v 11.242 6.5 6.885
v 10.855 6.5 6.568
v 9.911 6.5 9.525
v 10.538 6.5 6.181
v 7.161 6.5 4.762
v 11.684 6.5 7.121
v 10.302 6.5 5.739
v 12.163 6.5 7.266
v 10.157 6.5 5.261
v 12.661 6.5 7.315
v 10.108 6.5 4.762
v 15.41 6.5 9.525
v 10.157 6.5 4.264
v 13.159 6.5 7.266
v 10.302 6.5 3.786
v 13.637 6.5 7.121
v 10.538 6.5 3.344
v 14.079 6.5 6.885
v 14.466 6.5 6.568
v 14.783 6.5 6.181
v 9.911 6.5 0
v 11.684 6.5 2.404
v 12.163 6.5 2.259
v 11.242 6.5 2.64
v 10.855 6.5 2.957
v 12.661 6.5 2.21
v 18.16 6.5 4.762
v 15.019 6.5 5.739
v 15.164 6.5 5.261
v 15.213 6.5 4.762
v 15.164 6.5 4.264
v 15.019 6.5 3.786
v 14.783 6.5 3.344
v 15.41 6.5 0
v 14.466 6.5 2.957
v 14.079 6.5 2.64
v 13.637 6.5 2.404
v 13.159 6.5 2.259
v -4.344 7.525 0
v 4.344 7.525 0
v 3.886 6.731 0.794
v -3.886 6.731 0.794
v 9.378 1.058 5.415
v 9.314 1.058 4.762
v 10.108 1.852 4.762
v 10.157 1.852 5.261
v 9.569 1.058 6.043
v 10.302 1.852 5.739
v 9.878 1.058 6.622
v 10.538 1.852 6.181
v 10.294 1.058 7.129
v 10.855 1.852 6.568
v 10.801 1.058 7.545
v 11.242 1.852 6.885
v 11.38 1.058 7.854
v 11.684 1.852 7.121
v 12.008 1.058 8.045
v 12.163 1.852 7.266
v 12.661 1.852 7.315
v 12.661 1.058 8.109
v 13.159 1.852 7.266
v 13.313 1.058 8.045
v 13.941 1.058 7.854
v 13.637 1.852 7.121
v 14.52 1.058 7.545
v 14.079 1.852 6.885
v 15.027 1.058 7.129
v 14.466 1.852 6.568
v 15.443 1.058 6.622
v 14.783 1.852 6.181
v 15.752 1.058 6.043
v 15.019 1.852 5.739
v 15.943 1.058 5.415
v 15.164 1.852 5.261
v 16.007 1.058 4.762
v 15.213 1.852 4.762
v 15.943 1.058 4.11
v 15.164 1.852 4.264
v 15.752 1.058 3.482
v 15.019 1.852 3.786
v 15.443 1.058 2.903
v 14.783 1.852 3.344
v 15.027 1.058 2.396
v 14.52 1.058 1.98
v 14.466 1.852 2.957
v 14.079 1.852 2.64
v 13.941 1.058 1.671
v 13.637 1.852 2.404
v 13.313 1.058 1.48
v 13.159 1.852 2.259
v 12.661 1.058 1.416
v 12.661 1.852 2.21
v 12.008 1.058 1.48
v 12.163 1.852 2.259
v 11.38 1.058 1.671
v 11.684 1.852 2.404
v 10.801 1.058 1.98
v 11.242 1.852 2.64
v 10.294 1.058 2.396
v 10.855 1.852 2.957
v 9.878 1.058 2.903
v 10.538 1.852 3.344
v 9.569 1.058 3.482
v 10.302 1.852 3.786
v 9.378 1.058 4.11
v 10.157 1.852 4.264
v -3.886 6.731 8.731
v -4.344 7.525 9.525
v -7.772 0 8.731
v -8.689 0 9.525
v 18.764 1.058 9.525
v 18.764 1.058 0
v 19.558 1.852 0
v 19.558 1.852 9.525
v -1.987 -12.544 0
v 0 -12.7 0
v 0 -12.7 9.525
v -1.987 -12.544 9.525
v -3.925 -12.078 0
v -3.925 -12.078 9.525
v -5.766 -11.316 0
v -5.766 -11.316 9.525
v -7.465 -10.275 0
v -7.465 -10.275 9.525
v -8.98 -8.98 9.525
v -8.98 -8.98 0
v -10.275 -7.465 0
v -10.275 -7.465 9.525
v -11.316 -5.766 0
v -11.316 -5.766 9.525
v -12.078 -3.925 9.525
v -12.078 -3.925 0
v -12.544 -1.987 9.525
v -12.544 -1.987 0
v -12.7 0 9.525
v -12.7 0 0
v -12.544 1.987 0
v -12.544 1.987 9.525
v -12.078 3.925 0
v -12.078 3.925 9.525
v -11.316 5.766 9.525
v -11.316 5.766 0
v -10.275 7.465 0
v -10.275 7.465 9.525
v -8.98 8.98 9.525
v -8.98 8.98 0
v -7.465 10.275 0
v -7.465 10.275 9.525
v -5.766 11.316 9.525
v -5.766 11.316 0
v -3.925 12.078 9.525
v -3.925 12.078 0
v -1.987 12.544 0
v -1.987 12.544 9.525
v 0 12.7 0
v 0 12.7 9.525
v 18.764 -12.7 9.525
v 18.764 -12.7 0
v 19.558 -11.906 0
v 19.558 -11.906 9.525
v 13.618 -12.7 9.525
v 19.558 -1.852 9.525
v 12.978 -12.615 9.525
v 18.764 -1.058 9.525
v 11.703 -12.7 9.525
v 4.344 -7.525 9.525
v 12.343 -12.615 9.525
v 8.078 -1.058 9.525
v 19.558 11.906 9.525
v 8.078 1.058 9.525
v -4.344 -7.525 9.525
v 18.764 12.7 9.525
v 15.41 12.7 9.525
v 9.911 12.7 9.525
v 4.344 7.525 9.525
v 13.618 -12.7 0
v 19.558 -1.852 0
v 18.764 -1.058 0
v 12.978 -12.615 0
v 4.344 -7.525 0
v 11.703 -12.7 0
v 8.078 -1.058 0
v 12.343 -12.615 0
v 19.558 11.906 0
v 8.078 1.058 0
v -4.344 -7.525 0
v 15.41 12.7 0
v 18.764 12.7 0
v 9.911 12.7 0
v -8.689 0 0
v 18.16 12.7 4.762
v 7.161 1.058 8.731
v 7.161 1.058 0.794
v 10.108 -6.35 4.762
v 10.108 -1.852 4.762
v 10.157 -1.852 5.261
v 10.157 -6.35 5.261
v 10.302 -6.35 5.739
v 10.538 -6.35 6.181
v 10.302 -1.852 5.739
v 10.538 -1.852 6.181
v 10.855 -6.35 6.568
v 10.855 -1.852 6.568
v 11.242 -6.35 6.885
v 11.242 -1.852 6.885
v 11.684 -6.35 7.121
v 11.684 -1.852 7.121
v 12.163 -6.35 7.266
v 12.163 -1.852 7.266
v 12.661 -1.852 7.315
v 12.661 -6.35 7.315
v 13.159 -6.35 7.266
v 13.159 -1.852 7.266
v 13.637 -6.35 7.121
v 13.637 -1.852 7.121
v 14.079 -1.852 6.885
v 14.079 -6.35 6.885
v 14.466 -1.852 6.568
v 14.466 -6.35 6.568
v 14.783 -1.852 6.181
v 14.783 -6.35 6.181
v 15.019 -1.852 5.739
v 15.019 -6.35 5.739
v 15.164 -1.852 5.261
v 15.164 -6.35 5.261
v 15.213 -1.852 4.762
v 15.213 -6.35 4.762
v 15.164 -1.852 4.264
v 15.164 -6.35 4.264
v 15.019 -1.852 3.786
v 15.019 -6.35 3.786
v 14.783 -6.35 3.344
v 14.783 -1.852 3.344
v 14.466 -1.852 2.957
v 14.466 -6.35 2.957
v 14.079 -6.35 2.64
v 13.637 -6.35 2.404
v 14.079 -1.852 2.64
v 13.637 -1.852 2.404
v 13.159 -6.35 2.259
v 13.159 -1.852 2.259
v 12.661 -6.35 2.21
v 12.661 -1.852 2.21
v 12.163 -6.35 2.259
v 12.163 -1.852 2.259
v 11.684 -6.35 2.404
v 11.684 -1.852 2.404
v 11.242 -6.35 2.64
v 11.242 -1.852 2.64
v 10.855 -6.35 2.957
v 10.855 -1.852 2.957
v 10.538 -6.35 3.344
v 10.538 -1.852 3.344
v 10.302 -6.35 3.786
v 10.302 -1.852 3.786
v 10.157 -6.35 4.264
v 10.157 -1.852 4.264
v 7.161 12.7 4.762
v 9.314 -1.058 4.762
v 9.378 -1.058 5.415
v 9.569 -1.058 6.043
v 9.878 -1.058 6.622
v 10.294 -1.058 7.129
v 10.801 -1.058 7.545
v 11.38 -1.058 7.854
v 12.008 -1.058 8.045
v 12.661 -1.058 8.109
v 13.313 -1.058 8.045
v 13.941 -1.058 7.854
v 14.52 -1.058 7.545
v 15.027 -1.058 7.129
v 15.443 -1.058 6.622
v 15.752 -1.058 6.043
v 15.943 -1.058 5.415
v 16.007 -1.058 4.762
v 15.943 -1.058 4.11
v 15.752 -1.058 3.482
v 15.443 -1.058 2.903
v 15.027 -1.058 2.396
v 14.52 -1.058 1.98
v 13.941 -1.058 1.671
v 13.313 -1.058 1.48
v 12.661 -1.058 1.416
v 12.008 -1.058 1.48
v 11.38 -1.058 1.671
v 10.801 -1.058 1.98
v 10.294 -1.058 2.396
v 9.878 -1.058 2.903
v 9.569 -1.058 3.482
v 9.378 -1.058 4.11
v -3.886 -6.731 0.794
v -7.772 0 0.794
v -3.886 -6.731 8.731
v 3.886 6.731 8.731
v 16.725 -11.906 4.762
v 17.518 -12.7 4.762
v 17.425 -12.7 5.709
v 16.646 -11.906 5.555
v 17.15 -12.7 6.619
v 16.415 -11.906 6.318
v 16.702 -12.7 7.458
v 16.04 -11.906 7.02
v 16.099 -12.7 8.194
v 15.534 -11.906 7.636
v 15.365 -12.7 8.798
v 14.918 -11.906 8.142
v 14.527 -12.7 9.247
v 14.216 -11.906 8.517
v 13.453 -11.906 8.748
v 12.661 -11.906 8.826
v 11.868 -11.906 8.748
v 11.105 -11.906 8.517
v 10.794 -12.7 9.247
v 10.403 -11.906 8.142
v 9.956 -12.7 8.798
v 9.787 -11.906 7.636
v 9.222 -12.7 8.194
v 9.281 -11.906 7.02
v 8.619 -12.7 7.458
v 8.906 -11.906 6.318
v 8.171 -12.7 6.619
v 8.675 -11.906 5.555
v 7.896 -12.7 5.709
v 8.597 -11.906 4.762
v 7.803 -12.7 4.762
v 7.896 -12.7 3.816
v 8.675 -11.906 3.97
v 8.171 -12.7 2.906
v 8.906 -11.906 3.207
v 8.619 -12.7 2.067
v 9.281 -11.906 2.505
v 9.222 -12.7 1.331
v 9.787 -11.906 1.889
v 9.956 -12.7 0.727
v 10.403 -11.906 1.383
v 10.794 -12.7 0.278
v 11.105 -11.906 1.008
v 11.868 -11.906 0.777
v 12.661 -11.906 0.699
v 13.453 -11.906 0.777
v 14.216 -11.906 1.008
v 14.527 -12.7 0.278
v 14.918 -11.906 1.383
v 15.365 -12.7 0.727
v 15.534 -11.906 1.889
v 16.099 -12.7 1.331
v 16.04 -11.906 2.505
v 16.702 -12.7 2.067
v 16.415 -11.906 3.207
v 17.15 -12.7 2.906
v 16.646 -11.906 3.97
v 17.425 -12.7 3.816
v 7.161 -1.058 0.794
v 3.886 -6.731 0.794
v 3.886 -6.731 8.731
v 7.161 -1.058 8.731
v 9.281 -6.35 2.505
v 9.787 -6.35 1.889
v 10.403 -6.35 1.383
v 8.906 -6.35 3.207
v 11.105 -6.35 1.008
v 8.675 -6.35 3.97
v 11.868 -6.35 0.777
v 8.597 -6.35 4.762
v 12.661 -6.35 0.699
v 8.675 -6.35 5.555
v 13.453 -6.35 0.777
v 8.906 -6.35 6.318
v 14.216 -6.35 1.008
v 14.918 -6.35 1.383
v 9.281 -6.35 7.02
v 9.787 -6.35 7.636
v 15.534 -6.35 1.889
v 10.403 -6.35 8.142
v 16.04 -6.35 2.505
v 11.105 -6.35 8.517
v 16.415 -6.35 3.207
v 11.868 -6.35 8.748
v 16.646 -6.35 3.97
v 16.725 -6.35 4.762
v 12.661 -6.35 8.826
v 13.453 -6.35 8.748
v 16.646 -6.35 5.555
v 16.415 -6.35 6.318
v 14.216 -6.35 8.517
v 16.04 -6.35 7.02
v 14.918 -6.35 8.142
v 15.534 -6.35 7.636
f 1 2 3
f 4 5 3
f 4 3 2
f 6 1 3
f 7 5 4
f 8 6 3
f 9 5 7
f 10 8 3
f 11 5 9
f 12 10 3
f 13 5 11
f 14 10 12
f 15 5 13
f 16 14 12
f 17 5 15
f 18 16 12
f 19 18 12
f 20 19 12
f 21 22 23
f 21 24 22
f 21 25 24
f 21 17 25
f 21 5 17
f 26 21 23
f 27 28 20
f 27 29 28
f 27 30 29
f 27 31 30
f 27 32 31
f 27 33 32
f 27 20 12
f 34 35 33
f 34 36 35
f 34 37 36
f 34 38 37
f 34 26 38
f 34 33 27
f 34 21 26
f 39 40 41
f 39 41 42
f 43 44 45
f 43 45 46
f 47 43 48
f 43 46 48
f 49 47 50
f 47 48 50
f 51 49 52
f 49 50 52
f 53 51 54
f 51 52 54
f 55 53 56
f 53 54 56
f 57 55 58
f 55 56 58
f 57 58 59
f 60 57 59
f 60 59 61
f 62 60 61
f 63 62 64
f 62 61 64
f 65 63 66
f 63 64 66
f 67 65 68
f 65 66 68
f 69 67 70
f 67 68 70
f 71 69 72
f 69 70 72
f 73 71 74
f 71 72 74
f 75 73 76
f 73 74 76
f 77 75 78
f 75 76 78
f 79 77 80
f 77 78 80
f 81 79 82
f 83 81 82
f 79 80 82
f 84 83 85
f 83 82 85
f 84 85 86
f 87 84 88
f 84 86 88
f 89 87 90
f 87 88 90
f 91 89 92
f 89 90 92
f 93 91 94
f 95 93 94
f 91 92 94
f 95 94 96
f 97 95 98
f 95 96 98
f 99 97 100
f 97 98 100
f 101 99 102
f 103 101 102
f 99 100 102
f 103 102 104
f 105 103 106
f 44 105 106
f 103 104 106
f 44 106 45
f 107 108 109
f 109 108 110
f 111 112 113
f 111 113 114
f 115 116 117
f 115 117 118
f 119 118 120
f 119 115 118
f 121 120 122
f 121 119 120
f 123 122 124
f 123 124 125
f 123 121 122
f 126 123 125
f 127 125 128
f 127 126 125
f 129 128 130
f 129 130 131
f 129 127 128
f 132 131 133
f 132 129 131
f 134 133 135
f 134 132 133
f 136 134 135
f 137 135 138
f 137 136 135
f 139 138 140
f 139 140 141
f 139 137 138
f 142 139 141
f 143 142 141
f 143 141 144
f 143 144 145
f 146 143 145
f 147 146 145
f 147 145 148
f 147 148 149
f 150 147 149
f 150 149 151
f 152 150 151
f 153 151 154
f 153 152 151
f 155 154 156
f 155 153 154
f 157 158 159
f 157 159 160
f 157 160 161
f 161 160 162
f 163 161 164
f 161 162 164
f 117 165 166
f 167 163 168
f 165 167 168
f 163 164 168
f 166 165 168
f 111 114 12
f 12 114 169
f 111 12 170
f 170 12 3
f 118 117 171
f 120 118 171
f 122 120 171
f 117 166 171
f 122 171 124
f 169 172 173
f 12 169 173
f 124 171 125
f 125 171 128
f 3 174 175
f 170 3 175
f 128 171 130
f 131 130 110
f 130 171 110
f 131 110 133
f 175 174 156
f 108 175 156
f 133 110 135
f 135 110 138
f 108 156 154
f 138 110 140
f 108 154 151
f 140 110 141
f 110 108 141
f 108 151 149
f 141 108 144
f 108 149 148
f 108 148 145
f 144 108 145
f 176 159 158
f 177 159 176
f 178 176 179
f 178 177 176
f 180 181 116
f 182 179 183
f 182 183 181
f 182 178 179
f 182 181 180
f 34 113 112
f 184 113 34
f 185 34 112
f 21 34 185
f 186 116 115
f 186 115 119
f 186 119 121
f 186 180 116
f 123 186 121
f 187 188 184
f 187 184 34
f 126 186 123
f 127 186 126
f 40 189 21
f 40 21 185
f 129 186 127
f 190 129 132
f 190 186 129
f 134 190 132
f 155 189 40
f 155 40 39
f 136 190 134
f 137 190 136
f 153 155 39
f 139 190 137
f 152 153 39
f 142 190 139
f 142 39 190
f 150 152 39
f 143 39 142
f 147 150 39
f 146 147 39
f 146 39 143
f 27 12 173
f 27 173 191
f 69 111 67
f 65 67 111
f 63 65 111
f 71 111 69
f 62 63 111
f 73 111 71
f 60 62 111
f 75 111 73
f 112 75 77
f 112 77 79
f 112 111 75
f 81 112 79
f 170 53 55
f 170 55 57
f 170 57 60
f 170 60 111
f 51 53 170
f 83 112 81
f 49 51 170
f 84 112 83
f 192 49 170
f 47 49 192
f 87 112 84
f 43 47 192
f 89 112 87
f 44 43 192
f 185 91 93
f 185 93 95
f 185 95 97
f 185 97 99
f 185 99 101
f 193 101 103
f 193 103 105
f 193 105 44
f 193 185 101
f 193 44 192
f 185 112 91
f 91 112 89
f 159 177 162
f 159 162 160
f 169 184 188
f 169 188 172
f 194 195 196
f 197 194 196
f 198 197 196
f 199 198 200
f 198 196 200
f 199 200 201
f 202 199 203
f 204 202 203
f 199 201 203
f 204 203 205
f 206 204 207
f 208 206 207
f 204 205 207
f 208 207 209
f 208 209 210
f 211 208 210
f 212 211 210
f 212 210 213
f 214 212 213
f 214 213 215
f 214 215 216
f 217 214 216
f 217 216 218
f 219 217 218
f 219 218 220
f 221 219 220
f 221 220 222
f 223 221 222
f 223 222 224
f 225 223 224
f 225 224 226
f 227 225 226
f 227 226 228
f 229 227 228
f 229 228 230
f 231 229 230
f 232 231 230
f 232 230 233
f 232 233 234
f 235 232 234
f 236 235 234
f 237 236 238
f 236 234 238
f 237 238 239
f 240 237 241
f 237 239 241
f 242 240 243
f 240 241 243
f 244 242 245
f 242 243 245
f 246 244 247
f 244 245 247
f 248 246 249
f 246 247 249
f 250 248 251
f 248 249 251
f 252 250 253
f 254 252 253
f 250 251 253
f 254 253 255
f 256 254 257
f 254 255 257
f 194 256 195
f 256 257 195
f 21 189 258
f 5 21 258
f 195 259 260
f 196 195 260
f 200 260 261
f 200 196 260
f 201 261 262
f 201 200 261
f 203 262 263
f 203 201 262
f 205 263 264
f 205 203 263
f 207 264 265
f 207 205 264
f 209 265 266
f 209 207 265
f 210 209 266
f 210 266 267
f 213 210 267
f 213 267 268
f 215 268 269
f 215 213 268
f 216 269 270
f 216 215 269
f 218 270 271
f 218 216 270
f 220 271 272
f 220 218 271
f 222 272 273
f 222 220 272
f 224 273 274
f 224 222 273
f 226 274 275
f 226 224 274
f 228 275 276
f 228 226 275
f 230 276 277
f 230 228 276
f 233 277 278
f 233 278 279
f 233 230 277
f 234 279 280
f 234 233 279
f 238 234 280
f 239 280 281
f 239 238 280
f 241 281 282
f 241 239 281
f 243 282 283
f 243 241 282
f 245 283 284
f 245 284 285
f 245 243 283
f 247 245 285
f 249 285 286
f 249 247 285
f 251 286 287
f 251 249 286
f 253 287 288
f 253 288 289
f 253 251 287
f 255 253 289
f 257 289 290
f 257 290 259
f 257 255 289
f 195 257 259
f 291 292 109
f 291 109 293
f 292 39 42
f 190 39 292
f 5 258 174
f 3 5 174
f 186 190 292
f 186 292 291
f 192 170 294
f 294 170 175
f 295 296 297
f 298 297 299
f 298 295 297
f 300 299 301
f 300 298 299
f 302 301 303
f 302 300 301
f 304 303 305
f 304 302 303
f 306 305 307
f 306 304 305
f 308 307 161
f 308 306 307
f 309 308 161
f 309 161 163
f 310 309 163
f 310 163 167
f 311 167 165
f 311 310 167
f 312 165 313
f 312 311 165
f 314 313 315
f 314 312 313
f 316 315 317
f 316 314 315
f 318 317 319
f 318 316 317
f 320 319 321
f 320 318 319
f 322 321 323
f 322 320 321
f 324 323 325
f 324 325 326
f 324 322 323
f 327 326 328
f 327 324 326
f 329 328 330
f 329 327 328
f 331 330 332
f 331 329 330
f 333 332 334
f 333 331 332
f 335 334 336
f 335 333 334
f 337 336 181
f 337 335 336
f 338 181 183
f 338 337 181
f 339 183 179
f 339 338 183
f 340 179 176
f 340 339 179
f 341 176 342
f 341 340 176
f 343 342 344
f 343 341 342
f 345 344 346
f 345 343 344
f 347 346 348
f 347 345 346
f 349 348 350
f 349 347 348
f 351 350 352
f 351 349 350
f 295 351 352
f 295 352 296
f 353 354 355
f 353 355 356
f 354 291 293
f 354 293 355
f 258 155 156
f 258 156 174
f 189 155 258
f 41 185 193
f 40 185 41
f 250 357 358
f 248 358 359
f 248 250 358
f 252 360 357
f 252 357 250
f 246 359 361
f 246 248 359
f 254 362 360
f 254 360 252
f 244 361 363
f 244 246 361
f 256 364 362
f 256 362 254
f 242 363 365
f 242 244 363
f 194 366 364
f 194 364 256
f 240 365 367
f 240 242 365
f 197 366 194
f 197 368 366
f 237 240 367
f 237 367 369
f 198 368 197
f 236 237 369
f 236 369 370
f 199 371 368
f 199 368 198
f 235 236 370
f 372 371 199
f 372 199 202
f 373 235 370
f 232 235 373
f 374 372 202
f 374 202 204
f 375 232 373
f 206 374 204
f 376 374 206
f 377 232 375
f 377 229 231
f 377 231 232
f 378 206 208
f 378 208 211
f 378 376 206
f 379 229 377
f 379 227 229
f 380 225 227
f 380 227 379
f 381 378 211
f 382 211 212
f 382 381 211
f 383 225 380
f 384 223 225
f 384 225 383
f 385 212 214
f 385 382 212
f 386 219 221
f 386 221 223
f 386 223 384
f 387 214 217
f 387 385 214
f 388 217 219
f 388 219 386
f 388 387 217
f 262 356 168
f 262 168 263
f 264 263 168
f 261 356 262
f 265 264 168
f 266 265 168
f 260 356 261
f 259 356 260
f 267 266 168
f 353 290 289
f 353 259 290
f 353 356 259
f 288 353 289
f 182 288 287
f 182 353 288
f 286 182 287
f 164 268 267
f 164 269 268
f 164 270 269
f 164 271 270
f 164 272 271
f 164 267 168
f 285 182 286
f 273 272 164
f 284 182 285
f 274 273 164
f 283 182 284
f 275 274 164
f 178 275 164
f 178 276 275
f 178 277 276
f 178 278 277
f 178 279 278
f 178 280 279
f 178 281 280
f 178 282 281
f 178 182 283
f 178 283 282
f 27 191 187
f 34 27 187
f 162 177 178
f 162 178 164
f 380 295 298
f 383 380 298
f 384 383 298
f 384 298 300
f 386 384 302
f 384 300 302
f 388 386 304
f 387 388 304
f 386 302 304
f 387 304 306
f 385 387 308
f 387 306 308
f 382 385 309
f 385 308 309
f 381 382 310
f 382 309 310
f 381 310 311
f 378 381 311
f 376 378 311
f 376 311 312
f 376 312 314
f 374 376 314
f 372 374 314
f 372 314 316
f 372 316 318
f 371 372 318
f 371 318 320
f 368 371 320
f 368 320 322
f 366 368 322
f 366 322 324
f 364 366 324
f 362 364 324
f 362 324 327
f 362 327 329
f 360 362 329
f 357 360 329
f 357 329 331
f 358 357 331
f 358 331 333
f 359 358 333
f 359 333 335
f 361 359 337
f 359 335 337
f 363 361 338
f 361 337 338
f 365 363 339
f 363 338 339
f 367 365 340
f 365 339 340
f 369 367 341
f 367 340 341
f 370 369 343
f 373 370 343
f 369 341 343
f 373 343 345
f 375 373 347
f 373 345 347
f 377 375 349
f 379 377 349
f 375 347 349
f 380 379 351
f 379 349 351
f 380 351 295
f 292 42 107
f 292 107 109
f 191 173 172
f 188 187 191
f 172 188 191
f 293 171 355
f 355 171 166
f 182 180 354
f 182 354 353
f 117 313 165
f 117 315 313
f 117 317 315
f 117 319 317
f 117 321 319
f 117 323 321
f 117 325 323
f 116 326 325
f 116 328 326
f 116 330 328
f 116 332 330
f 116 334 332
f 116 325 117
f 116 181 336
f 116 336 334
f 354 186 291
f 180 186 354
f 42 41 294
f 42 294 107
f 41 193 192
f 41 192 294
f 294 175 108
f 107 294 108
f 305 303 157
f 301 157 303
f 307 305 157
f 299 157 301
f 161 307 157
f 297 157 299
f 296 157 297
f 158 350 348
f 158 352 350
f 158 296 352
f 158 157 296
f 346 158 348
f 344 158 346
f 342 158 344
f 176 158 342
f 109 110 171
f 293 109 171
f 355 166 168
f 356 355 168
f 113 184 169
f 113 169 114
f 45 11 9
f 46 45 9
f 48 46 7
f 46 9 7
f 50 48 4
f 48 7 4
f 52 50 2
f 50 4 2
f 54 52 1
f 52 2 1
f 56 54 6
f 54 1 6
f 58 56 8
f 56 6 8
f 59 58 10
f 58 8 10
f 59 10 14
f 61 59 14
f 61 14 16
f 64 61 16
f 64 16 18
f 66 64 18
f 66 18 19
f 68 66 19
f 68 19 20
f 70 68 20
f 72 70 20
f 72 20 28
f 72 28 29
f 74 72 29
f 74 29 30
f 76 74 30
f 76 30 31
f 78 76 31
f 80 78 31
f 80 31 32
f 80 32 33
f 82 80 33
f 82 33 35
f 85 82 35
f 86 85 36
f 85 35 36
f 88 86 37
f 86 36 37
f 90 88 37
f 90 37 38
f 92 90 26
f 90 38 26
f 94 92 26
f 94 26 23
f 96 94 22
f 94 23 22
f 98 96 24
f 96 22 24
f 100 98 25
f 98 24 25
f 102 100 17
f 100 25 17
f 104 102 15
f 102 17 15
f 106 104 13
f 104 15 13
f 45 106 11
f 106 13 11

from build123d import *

# Parameters (mm, degrees)
BOSS_EXTRUDE1_DEPTH = 9.525
CHAMFER1_SIZE       = 0.79375
SKETCH3_R           = 2.5527
CUT_EXTRUDE1_DEPTH  = 34.442502732
CUT_EXTRUDE2_DEPTH  = 6.2
SKETCH5_R           = 4.064
CUT_EXTRUDE3_DEPTH  = 6.35
CHAFL_N1_SIZE       = 0.79375


with BuildPart() as part:
    # Sketch2 → Boss-Extrude1 (new body)
    with BuildSketch(Plane.XY):
        with BuildLine():
            Line((3.886144662, -6.731), (7.161260289, -1.058333333))
            Line((7.161260289, -1.058333333), (9.779, -1.058333333))
            Line((9.779, -1.058333333), (19.558, -1.058333333))
            Line((19.558, -1.058333333), (19.558, -12.7))
            Line((19.558, -12.7), (0, -12.7))
            ThreePointArc((0, -12.7), (-12.7, 0), (0, 12.7))
            Line((0, 12.7), (19.558, 12.7))
            Line((19.558, 12.7), (19.558, 1.058333333))
            Line((19.558, 1.058333333), (9.779, 1.058333333))
            Line((9.779, 1.058333333), (7.161260289, 1.058333333))
            Line((7.161260289, 1.058333333), (3.886144662, 6.731))
            Line((3.886144662, 6.731), (-3.886144662, 6.731))
            Line((-3.886144662, 6.731), (-7.772289324, 0))
            Line((-7.772289324, 0), (-3.886144662, -6.731))
            Line((-3.886144662, -6.731), (3.886144662, -6.731))
        make_face()
    extrude(amount=BOSS_EXTRUDE1_DEPTH)

    # Chamfer1
    chamfer1_edges = [part.edges().sort_by_distance(p)[0] for p in [
        (5.523702475, 3.894666667, 0),
        (0, 6.731, 0),
        (-5.829216993, 3.3655, 0),
        (-5.829216993, -3.3655, 0),
        (0, -6.731, 0),
        (5.523702475, -3.894666667, 0),
        (19.558, -1.058333333, 4.7625),
        (19.558, -12.7, 4.7625),
        (19.558, 12.7, 4.7625),
        (19.558, 1.058333333, 4.7625),
        (5.523702475, -3.894666667, 9.525),
        (0, -6.731, 9.525),
        (-5.829216993, -3.3655, 9.525),
        (-5.829216993, 3.3655, 9.525),
        (0, 6.731, 9.525),
        (5.523702475, 3.894666667, 9.525),
    ]]
    chamfer(chamfer1_edges, length=CHAMFER1_SIZE)

    # Sketch3 → Cut-Extrude1 (cut, through all)
    with BuildSketch(Plane(origin=(0, 12.7, 0), x_dir=(1, 0, 0), z_dir=(0, 1, 0))):
        with Locations(Location((12.660521603, -4.7625, 0), (0, 0, 180))):
            Circle(SKETCH3_R)
    extrude(amount=-CUT_EXTRUDE1_DEPTH, mode=Mode.SUBTRACT)

    # Sketch4 → Cut-Extrude2 (cut)
    with BuildSketch(Plane(origin=(0, 12.7, 0), x_dir=(1, 0, 0), z_dir=(0, 1, 0))):
        Polygon((9.910890946, -9.525), (15.41015226, -9.525), (18.159782917, -4.7625), (15.41015226, 0), (9.910890946, 0), (7.161260289, -4.7625), align=None)
    extrude(amount=-CUT_EXTRUDE2_DEPTH, mode=Mode.SUBTRACT)

    # Sketch5 → Cut-Extrude3 (cut)
    with BuildSketch(Plane.XZ.offset(12.7)):
        with Locations((12.660521603, 4.7625)):
            Circle(SKETCH5_R)
    extrude(amount=-CUT_EXTRUDE3_DEPTH, mode=Mode.SUBTRACT)

    # Chaflán1
    # the kernel refuses this chamfer: 0.79375 mm, written as the material it takes off along each edge
    with BuildSketch(Plane(origin=(12.660521603, -1.058333333, 4.7625), x_dir=(-1, 0, 0), z_dir=(0, 0, -1))) as chafl_n1_piece_1:
        Polygon((2.5527 + CHAFL_N1_SIZE, 0), (2.5527, -CHAFL_N1_SIZE), (2.5527, 0), align=None)
    revolve(axis=Axis((12.660521603, -1.058333333, 4.7625), (0, 1, 0)), mode=Mode.SUBTRACT)
    with BuildSketch(Plane(origin=(12.660521603, 1.058333333, 4.7625), x_dir=(-1, 0, 0), z_dir=(0, 0, -1))) as chafl_n1_piece_2:
        Polygon((2.5527 + CHAFL_N1_SIZE, 0), (2.5527, CHAFL_N1_SIZE), (2.5527, 0), align=None)
    revolve(axis=Axis((12.660521603, 1.058333333, 4.7625), (0, 1, 0)), mode=Mode.SUBTRACT)
    with BuildSketch(Plane(origin=(12.660521603, -12.7, 4.7625), x_dir=(1, 0, 0), z_dir=(0, 0, -1))) as chafl_n1_piece_3:
        Polygon((4.064 + CHAFL_N1_SIZE, 0), (4.064, -CHAFL_N1_SIZE), (4.064, 0), align=None)
    revolve(axis=Axis((12.660521603, -12.7, 4.7625), (0, -1, 0)), mode=Mode.SUBTRACT)


solid = part.part
